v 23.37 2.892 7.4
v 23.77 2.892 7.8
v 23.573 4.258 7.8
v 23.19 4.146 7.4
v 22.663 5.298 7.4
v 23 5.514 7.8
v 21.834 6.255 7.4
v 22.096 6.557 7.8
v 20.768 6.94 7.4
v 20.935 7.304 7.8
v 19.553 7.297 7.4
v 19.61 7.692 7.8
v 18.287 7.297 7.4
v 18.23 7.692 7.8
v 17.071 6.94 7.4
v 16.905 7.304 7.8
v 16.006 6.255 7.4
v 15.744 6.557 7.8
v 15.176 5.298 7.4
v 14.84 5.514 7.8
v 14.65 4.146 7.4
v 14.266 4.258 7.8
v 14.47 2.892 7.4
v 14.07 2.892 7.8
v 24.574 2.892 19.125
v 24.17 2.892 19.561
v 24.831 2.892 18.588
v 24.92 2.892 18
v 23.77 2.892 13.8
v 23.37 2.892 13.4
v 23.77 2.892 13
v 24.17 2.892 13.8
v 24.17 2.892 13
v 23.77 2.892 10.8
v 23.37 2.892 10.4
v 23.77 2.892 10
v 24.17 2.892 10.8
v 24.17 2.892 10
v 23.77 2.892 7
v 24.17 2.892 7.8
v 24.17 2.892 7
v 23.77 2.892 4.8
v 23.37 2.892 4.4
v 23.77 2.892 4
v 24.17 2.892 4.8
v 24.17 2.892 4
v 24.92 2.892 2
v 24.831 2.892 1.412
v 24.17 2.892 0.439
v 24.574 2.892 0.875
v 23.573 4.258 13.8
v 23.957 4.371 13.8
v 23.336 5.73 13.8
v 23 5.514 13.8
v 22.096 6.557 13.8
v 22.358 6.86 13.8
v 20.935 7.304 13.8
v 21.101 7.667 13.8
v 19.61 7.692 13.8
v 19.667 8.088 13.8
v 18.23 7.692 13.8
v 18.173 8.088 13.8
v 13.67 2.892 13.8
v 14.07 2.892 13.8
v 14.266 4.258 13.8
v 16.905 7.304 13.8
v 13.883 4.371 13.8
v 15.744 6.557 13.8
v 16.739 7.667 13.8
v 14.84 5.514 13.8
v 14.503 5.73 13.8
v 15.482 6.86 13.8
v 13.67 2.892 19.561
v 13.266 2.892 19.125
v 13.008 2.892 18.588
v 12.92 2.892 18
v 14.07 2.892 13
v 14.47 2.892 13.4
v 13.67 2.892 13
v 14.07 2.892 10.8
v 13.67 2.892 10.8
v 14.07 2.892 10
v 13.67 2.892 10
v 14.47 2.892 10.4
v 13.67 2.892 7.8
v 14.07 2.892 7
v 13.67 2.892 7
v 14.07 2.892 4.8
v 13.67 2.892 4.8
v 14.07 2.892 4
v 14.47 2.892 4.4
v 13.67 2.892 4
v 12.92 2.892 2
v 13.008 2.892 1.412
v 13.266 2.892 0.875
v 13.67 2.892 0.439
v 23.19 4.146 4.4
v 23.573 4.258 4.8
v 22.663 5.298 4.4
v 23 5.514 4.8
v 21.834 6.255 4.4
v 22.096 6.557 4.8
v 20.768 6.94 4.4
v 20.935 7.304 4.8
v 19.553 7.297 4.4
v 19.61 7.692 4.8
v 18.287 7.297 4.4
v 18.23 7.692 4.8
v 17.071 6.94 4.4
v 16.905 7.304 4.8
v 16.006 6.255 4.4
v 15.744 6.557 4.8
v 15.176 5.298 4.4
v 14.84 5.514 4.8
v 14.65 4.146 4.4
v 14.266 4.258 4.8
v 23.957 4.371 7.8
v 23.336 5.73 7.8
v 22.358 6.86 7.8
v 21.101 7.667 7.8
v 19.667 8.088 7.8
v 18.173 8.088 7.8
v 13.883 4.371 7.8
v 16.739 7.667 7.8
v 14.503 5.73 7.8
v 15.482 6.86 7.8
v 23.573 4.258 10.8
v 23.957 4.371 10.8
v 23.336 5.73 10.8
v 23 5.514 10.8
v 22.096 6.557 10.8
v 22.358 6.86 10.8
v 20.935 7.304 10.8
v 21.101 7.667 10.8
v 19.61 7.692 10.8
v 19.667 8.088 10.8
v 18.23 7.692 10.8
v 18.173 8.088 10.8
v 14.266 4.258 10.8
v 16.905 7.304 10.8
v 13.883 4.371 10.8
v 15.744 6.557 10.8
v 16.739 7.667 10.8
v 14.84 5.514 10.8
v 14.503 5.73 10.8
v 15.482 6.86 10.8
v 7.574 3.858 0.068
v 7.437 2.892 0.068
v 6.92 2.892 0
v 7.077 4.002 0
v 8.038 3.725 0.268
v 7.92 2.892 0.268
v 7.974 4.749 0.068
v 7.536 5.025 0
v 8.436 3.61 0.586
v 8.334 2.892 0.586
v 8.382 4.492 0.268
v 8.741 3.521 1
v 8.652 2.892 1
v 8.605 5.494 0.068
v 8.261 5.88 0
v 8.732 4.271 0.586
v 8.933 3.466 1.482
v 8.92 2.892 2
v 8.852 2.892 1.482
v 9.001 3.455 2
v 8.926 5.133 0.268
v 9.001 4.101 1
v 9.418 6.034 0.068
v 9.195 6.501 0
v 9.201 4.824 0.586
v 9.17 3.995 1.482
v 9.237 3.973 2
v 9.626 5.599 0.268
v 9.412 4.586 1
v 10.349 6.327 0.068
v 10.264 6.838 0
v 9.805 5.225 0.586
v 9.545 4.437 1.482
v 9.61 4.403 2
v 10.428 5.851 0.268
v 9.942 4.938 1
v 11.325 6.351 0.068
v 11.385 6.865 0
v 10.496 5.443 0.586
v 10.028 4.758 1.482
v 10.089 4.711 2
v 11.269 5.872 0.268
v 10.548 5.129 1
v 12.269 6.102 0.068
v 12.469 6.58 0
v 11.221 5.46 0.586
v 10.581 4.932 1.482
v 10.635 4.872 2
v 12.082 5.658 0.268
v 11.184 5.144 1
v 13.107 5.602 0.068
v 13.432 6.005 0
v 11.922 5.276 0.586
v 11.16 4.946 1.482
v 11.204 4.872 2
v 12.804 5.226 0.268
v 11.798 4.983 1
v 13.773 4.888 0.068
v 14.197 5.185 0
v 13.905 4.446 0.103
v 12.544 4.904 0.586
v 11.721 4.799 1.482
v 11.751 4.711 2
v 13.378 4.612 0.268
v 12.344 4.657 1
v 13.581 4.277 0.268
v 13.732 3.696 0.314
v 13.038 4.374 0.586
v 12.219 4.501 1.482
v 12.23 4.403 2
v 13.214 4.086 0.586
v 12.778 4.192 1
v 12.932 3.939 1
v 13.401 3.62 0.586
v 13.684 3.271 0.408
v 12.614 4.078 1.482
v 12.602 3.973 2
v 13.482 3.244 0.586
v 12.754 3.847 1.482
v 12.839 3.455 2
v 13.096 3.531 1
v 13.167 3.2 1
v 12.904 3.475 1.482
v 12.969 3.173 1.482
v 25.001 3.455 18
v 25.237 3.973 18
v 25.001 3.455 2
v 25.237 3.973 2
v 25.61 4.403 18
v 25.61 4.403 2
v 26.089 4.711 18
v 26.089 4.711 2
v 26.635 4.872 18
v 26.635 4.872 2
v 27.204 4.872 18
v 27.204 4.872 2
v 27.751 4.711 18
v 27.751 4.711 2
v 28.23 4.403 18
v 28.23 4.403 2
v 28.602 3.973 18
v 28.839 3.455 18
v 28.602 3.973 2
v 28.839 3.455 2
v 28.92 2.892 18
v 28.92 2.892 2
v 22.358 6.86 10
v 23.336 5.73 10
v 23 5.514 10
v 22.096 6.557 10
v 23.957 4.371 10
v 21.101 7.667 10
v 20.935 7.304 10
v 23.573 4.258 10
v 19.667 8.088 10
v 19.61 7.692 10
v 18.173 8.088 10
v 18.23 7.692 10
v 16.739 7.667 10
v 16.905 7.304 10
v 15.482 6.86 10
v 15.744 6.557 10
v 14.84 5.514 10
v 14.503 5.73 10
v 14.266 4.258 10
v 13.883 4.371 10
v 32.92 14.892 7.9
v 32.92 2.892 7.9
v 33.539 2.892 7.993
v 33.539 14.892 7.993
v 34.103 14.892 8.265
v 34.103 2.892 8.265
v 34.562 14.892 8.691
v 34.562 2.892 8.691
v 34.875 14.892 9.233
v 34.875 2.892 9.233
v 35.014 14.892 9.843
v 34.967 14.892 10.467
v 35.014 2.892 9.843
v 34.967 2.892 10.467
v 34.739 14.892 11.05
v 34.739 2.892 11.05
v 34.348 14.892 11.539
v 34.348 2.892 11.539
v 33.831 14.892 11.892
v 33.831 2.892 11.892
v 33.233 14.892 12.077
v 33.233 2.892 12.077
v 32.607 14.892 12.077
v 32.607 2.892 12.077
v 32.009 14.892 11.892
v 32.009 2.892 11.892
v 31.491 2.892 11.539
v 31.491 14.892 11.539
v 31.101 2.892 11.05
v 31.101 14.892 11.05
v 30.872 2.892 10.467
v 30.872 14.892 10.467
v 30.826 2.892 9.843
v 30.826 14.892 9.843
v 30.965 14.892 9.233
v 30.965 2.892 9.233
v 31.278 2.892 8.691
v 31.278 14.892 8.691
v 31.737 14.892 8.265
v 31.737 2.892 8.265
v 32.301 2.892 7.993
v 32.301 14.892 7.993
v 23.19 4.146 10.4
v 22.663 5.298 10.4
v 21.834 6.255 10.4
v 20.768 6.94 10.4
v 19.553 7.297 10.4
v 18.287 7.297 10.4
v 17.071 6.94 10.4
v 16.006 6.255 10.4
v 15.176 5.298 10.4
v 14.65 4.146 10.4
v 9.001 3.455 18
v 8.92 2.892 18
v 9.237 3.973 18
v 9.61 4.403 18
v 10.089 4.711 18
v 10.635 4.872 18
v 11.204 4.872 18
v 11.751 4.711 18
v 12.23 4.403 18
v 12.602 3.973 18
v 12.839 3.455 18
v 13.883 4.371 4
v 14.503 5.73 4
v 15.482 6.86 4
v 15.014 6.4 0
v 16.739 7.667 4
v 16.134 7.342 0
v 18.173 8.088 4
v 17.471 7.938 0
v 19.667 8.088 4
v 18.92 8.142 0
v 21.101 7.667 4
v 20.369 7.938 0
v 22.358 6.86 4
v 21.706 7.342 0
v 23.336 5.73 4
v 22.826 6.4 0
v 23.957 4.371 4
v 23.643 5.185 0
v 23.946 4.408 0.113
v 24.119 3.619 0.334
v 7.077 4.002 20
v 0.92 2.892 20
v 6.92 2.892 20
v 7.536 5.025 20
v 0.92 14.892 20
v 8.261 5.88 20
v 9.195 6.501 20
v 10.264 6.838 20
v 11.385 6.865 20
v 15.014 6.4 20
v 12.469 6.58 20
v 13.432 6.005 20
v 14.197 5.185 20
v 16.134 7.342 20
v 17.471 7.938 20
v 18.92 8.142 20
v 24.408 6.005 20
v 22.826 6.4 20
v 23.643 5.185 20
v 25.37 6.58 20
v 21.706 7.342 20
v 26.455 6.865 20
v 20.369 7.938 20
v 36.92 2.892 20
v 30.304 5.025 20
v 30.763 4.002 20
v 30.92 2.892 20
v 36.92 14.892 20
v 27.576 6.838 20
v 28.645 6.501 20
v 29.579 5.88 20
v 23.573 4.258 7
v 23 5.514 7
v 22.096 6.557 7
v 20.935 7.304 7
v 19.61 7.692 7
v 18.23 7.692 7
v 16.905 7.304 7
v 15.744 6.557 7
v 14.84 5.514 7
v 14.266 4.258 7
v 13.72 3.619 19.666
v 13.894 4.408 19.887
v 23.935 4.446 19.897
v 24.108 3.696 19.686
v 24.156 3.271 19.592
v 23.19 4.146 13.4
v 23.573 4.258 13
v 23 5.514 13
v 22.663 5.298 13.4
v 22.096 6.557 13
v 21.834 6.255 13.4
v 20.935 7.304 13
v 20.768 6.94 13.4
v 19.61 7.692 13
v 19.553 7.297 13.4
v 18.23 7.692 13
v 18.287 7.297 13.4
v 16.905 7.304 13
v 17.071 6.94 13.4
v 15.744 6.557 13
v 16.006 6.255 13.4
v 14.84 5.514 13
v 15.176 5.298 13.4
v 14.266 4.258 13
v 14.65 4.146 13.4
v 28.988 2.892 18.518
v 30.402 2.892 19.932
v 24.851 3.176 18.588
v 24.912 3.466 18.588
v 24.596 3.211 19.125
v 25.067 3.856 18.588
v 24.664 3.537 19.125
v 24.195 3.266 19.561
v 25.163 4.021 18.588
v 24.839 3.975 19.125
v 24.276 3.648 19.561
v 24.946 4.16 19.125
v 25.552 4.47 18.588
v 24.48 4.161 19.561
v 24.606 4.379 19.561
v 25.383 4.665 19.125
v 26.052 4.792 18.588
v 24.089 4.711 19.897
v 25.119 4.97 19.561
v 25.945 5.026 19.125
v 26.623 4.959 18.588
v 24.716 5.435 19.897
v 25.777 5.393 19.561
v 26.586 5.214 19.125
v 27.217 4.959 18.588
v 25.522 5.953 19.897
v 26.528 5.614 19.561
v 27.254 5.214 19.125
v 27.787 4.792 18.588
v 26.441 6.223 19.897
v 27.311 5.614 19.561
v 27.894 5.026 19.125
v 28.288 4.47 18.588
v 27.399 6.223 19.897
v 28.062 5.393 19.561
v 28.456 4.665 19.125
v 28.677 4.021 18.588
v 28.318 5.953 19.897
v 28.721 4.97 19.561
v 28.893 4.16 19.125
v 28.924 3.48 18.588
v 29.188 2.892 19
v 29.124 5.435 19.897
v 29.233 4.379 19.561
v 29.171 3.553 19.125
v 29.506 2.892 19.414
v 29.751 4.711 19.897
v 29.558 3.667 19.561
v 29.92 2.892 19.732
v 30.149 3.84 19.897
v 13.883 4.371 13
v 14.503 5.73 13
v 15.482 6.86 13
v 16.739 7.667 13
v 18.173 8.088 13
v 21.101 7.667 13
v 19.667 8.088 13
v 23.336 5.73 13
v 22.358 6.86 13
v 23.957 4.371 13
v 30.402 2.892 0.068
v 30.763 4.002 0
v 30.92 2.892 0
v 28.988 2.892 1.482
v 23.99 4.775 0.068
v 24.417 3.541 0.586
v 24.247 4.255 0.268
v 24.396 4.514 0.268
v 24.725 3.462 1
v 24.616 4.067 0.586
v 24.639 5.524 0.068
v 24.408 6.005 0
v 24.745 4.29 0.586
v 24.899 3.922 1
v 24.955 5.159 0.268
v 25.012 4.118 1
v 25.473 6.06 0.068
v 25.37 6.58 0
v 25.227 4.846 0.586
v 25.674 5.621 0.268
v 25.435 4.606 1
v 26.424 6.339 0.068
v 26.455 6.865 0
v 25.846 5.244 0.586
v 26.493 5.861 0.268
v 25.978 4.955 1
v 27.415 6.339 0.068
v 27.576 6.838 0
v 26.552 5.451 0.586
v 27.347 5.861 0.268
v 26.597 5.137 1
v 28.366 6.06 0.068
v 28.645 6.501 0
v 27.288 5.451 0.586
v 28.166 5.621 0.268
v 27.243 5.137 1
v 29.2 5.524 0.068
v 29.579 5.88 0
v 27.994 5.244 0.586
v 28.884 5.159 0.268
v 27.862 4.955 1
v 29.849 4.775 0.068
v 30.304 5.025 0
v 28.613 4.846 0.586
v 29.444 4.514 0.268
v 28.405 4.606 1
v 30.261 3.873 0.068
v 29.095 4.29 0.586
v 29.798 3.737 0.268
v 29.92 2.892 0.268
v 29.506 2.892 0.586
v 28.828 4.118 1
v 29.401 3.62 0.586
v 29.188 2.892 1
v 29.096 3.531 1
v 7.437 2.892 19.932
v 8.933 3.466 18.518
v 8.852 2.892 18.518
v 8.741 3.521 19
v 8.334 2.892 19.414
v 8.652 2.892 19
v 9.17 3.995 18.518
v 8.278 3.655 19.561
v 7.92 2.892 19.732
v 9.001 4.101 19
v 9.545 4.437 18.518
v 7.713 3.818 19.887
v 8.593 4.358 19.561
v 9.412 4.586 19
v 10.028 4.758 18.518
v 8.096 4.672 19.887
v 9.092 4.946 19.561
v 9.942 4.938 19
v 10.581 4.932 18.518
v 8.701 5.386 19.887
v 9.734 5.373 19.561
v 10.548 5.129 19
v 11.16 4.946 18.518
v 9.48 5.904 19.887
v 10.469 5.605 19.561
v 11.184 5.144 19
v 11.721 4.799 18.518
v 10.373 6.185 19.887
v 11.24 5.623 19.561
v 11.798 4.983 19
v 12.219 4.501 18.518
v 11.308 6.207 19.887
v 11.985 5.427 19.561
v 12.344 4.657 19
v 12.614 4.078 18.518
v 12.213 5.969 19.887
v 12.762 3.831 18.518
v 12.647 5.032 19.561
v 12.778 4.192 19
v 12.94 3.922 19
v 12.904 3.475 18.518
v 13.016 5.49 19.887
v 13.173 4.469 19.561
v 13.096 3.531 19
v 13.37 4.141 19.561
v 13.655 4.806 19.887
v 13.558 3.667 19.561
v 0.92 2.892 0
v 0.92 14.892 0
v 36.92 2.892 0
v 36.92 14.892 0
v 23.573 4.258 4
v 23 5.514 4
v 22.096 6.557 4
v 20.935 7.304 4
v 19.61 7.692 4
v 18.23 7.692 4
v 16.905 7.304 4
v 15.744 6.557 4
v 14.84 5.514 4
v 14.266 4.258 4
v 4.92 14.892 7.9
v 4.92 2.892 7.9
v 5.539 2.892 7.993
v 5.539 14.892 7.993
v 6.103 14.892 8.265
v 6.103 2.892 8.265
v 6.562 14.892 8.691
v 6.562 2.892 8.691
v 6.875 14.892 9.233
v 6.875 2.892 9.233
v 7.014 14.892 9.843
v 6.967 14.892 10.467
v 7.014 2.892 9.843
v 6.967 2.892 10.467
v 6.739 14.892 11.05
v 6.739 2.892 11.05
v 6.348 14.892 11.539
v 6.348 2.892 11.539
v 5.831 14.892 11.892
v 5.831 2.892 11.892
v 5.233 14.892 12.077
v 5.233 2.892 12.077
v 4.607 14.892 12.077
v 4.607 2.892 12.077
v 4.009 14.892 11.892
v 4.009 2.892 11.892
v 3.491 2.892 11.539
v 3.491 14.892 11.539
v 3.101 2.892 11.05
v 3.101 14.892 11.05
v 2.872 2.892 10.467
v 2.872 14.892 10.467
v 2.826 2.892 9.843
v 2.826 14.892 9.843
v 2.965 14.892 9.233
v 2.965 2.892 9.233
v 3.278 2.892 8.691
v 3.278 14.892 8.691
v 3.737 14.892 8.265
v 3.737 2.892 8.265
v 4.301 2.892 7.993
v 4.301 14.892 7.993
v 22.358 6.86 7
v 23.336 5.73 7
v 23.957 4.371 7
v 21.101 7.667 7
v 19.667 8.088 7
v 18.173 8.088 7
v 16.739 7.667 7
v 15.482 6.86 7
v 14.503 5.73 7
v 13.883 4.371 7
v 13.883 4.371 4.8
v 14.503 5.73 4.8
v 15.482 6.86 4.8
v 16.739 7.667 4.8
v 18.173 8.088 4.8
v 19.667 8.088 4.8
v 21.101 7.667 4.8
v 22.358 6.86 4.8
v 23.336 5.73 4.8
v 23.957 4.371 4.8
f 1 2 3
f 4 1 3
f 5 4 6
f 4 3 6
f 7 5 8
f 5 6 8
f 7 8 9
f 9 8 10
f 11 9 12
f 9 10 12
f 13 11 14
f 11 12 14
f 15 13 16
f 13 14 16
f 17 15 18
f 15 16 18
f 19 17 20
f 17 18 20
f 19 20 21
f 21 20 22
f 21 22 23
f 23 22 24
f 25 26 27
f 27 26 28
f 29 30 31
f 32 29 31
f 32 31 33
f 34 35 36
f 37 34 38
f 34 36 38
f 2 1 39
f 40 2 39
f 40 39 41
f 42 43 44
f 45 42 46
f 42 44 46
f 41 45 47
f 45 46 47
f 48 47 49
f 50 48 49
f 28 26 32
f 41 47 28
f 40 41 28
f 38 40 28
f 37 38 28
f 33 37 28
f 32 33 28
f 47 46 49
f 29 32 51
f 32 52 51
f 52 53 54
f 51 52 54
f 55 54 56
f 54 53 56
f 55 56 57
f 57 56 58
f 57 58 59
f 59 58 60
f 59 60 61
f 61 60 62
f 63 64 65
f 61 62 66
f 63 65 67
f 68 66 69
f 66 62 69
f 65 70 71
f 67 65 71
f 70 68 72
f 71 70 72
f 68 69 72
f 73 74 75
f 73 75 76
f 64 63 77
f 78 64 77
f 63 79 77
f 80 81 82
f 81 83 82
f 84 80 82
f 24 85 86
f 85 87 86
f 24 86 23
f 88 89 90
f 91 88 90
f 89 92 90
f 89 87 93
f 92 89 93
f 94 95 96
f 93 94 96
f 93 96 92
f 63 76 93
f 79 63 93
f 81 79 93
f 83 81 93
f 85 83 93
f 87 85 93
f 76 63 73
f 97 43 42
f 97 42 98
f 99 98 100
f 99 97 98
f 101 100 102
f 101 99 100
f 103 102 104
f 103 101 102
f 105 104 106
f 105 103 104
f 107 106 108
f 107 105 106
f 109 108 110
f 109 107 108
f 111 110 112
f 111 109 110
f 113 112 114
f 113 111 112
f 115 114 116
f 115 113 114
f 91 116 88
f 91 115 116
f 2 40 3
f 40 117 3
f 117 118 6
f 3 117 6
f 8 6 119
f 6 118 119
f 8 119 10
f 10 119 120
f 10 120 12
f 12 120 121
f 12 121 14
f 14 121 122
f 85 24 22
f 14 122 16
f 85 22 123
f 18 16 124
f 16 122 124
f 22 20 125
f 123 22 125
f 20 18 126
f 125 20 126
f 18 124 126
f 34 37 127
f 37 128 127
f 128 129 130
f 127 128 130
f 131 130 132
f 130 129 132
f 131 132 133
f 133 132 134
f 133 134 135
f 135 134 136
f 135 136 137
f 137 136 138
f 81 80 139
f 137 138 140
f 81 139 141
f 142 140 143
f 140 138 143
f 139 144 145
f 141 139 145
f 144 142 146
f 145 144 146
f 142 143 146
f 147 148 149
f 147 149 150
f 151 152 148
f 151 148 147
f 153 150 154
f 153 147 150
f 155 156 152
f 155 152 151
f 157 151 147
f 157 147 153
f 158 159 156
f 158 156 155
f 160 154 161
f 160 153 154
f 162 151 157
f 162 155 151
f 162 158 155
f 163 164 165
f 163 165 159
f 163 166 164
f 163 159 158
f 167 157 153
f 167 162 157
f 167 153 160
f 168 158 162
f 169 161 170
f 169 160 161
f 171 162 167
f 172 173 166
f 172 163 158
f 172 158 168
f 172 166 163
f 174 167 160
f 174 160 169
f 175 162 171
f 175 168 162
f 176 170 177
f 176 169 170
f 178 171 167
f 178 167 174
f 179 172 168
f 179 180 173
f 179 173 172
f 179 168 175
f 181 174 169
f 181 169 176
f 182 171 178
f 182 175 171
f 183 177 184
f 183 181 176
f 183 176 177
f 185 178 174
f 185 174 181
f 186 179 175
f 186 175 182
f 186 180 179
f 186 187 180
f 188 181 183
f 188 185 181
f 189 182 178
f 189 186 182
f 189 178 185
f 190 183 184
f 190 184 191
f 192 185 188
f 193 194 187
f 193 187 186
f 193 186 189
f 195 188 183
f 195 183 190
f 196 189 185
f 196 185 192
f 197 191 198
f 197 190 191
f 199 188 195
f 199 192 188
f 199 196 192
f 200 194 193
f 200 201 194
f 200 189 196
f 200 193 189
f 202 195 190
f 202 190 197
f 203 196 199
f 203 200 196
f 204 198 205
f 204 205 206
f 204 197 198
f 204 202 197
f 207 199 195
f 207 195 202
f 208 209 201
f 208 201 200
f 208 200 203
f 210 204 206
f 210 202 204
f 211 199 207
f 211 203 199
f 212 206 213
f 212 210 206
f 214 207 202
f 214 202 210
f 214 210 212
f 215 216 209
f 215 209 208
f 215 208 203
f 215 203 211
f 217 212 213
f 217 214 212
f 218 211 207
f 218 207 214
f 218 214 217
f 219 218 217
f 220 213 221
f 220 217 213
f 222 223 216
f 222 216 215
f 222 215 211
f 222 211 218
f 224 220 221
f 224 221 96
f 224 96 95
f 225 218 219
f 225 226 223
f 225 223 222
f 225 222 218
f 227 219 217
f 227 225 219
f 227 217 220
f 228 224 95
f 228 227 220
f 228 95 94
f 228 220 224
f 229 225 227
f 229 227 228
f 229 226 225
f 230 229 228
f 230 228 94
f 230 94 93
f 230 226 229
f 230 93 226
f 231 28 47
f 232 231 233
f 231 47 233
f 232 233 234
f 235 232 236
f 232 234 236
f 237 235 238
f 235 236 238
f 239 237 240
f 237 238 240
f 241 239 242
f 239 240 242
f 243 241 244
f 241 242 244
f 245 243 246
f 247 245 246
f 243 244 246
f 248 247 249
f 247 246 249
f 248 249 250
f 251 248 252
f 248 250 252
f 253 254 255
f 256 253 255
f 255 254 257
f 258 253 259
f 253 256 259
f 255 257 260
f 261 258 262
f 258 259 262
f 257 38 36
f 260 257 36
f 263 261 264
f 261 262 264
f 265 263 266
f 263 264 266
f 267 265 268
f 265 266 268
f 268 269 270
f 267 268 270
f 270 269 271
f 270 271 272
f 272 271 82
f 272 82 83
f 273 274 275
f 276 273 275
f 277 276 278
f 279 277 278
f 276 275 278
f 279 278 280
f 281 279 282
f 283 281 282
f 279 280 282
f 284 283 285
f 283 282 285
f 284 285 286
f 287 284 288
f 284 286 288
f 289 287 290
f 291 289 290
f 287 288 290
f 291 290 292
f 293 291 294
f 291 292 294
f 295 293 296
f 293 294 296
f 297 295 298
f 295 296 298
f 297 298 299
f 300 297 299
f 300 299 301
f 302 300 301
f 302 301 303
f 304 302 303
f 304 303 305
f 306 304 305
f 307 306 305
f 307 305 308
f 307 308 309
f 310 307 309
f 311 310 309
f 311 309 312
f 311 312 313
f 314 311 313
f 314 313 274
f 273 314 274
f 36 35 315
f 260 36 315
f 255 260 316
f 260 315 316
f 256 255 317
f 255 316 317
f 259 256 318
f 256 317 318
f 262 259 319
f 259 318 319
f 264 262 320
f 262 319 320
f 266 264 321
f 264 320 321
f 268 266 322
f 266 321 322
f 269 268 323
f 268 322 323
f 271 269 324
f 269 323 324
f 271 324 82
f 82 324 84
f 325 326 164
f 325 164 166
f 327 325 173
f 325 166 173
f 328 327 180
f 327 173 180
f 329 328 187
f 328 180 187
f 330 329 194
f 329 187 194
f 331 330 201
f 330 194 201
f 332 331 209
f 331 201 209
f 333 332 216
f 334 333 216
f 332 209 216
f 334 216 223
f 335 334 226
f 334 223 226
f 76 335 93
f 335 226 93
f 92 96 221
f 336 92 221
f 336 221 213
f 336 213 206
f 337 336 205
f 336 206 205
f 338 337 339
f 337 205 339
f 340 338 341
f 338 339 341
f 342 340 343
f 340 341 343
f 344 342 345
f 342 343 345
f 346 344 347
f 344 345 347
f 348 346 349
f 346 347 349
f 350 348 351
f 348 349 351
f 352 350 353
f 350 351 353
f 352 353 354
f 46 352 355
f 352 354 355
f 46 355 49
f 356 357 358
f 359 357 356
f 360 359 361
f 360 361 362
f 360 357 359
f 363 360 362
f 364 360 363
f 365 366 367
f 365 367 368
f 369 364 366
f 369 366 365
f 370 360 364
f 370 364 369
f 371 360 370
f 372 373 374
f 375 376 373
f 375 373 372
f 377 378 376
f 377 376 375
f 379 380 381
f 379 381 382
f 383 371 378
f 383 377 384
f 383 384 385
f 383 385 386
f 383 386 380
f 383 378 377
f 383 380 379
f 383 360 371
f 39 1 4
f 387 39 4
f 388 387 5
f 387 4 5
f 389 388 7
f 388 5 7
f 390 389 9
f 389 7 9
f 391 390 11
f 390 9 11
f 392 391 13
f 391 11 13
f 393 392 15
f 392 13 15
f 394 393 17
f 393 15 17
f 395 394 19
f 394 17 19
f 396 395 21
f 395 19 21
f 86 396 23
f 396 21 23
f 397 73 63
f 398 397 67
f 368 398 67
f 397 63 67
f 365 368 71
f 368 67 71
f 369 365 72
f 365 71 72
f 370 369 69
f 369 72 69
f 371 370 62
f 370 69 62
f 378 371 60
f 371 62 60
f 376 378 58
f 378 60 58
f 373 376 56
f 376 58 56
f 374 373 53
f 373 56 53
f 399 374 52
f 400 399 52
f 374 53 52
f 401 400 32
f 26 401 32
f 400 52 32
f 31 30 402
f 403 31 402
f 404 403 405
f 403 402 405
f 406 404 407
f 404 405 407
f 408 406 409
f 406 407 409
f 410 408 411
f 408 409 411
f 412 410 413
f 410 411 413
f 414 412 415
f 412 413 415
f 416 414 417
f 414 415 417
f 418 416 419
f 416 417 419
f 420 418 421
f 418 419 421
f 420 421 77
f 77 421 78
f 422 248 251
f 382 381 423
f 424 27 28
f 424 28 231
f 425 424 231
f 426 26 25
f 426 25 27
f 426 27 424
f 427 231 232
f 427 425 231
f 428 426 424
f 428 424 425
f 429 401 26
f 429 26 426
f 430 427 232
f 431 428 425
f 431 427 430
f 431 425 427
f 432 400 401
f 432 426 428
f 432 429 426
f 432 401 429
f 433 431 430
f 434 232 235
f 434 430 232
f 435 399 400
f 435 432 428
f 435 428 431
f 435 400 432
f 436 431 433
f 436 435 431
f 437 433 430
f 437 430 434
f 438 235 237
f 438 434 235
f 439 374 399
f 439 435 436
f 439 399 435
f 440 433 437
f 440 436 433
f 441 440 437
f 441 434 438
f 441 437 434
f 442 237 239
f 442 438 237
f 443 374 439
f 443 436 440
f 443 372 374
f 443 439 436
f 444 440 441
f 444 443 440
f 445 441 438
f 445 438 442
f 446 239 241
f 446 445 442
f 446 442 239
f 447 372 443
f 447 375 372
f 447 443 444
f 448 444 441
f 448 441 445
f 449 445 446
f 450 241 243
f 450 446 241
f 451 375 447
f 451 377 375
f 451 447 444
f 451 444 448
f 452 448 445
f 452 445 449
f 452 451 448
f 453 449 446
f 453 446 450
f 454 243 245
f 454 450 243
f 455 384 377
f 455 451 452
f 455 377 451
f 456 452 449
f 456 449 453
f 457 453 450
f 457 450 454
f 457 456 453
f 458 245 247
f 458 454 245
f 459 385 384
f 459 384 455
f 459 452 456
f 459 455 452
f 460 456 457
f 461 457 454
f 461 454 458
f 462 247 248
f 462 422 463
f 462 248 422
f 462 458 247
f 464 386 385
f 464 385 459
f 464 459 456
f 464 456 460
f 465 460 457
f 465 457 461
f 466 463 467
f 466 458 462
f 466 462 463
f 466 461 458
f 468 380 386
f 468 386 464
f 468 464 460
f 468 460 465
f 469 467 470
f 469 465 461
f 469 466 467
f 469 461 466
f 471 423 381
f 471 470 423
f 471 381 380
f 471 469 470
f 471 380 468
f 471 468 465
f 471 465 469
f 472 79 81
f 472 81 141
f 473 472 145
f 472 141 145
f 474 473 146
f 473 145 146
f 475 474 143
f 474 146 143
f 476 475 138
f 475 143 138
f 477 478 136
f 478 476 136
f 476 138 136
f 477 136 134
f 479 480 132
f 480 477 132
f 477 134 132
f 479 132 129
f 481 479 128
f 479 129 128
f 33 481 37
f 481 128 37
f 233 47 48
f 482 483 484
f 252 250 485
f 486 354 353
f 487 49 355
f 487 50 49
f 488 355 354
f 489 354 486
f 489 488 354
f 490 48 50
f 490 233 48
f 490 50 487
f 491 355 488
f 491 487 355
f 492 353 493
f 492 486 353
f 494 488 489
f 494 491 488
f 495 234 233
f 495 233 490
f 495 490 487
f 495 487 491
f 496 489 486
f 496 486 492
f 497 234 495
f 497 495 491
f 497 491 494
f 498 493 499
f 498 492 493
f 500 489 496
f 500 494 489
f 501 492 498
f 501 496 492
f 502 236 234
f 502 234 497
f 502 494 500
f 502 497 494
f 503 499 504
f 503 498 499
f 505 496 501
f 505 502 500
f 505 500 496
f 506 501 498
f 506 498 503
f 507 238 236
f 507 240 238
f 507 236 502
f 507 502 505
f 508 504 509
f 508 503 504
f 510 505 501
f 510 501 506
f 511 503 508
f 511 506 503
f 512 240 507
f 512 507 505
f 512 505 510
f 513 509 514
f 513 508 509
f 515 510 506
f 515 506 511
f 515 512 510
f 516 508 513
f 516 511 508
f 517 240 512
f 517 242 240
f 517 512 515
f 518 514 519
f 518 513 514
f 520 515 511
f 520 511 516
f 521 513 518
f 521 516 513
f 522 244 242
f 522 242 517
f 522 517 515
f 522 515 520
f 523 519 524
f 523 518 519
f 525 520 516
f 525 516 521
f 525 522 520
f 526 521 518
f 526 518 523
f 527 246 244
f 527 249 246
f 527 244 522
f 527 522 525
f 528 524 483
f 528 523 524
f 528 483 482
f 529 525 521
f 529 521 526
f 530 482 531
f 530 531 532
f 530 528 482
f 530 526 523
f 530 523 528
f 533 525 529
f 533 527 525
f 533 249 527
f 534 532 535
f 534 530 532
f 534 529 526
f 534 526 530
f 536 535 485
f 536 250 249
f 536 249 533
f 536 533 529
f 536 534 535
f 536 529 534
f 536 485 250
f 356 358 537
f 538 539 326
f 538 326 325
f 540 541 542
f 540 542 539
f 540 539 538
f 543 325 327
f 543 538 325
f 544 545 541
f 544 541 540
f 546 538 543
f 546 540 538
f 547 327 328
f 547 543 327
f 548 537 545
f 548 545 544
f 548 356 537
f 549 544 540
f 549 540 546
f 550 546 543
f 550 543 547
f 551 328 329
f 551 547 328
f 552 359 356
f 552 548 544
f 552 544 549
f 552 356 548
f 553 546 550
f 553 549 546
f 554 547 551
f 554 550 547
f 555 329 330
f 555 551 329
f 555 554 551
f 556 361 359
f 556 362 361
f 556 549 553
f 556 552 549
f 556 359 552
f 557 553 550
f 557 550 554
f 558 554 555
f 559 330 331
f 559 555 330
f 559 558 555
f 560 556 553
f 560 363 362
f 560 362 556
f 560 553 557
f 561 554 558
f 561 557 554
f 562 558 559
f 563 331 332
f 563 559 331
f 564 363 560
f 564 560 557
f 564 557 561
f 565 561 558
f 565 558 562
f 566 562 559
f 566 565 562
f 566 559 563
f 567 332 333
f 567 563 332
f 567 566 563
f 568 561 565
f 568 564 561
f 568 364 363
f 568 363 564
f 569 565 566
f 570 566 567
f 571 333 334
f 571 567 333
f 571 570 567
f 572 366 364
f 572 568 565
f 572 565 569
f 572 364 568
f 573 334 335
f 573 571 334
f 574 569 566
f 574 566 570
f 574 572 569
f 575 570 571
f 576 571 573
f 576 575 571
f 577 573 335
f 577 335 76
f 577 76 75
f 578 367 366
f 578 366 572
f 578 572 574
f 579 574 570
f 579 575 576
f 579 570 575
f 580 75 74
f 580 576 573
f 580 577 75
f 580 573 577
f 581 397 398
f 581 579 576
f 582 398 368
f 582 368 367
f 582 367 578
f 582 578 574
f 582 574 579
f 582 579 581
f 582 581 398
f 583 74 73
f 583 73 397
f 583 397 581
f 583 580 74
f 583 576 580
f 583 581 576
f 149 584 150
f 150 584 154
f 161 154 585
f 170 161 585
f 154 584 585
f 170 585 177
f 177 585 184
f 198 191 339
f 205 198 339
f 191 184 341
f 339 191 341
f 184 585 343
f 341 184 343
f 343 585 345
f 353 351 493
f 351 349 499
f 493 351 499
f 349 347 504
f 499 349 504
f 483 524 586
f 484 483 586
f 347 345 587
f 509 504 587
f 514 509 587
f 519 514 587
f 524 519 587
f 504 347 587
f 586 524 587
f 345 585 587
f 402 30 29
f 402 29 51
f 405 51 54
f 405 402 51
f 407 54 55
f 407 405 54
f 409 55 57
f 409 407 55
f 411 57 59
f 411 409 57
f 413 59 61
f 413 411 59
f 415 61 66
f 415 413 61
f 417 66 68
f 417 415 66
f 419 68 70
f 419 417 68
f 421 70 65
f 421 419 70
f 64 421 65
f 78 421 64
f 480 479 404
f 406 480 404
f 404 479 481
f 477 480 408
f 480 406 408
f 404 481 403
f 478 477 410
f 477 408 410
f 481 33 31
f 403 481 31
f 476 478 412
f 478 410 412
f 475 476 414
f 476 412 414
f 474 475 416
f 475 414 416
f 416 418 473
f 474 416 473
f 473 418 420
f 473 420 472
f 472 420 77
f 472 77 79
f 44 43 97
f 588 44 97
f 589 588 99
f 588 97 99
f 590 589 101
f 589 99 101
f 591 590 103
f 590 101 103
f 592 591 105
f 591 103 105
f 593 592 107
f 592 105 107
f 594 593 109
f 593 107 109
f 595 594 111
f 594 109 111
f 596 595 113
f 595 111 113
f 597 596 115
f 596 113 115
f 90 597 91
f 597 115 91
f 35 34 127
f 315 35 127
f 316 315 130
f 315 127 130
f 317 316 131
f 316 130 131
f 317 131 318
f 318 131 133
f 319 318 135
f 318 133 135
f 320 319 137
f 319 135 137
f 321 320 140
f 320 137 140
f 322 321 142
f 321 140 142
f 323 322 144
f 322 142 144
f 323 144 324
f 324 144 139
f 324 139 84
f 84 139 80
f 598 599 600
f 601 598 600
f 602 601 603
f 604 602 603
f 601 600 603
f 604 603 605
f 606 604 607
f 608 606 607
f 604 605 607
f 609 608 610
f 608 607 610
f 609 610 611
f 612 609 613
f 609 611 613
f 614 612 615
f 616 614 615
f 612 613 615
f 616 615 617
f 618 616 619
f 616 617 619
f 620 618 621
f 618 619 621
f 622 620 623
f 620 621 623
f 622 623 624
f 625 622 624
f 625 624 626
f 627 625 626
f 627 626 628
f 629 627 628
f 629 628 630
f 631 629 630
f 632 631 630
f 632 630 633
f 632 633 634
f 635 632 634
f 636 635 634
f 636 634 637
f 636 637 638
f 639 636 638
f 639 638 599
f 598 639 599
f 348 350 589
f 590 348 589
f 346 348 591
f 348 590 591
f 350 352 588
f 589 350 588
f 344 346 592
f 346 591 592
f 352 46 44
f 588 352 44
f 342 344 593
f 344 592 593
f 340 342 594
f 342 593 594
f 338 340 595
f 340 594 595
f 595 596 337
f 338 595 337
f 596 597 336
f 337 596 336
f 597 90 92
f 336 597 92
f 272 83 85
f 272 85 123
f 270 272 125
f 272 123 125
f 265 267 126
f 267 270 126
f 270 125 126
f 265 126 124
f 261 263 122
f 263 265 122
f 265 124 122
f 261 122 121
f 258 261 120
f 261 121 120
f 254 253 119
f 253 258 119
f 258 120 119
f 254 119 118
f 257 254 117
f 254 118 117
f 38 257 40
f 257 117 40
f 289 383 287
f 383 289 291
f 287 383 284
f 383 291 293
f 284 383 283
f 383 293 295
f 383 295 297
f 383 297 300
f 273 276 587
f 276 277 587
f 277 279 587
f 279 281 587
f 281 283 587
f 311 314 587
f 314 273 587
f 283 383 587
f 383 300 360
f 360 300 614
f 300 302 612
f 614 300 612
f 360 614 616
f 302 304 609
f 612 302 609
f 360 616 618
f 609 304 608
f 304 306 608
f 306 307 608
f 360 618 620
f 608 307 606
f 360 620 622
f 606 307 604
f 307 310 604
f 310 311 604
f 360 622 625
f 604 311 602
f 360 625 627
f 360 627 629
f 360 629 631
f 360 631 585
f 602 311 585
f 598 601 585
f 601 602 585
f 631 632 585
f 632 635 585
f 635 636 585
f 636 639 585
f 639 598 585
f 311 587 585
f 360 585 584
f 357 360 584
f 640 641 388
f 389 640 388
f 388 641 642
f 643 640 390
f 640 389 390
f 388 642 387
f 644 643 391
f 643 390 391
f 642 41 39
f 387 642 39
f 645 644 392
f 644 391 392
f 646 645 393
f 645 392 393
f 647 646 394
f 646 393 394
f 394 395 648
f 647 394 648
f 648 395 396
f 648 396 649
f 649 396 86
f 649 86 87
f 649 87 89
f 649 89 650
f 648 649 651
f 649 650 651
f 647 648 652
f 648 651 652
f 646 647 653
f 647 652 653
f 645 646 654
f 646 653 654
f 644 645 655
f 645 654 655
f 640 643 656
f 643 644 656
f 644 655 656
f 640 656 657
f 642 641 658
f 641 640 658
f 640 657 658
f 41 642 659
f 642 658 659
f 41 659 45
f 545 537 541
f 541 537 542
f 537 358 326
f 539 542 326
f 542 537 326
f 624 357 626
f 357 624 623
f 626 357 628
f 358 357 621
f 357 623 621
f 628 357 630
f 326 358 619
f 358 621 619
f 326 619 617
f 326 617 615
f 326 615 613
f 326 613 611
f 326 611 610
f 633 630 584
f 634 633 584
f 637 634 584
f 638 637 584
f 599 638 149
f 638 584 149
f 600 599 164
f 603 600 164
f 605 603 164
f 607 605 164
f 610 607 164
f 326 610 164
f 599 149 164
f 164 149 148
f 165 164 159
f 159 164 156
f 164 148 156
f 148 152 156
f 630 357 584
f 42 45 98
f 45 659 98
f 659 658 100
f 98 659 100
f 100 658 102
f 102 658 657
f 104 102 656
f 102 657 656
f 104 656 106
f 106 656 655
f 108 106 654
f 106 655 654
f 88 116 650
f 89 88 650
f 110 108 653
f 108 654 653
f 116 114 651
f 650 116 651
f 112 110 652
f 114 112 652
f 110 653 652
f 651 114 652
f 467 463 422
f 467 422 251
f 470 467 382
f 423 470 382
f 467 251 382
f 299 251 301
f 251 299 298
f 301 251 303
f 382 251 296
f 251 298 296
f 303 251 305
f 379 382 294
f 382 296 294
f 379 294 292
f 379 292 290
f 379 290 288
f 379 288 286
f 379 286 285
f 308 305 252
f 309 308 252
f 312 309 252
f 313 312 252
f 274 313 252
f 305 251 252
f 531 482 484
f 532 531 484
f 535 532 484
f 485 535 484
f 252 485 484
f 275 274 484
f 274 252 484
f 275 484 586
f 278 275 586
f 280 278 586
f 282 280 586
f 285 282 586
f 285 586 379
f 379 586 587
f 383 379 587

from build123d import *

# Parameters (mm, degrees)
BOSS_EXTRUDE1_DEPTH = 20
SKETCH2_W           = 0.8000000000000007
SKETCH2_H           = 0.7999999999999989
SKETCH2_H_2         = 0.8000000000000007
CHAMFER1_SIZE       = 0.4
FILLET2_R           = 2
SKETCH3_R           = 2.100000000000004
SKETCH3_R_2         = 2.100000000000001
CUT_EXTRUDE1_DEPTH  = 44.67007193971907


# Some blends are built 0.0001 mm under size
with BuildPart() as part:
    # Sketch1 → Boss-Extrude1 (new body)
    with BuildSketch(Plane.XY):
        with BuildLine():
            Line((0.9198479389646088, 14.89190109356241), (0.9198479389646088, 2.89190109356241))
            Line((0.9198479389646081, 2.89190109356241), (8.919847938964608, 2.89190109356241))
            ThreePointArc((8.919847938964608, 2.8919010935624105), (10.919847938964608, 4.89190109356241), (12.919847938964608, 2.89190109356241))
            Line((12.919847938964608, 2.89190109356241), (13.669847938964606, 2.89190109356241))
            ThreePointArc((13.669847938964608, 2.8919010935624114), (18.919847938964608, 8.14190109356241), (24.169847938964608, 2.89190109356241))
            Line((24.169847938964608, 2.89190109356241), (24.919847938964608, 2.89190109356241))
            ThreePointArc((24.919847938964608, 2.8919010935624105), (26.919847938964608, 4.891901093562406), (28.919847938964608, 2.89190109356241))
            Line((28.919847938964605, 2.89190109356241), (36.91984793896461, 2.89190109356241))
            Line((36.91984793896461, 2.89190109356241), (36.91984793896461, 14.89190109356241))
            Line((36.91984793896461, 14.89190109356241), (0.9198479389646088, 14.89190109356241))
        make_face()
    extrude(amount=BOSS_EXTRUDE1_DEPTH)

    # Sweep2: sweep along a curve in space
    with BuildLine() as sweep2_path:
        ThreePointArc((24.169847938964608, 2.89190109356241, 20), (22.632158540193984, 6.604211694791784, 20), (18.919847938964608, 8.141901093562412, 20))
        ThreePointArc((18.919847938964608, 8.141901093562412, 20), (15.207537337735232, 6.604211694791786, 20), (13.669847938964606, 2.89190109356241, 20))
    # Sketch2 → Sweep2 (sweep)
    with BuildSketch(Plane.XZ.offset(-2.89190109356241)):
        with Locations((14.069847938964607, 13.400000000000006)):
            Rectangle(SKETCH2_W, SKETCH2_H)
        with Locations((14.069847938964607, 10.400000000000004)):
            Rectangle(SKETCH2_W, SKETCH2_H_2)
        with Locations((14.069847938964607, 7.400000000000003)):
            Rectangle(SKETCH2_W, SKETCH2_H_2)
        Polygon((13.669847938964608, 4.8000000000000025), (14.469847938964607, 4.8000000000000025), (14.469847938964609, 4.000000000000002), (13.669847938964608, 4.000000000000002), align=None)
    sweep(path=sweep2_path.line)

    # Chamfer1
    chamfer1_edges = [part.edges().sort_by_distance(p)[0] for p in [
        (18.919847938964608, 7.341901093562408, 4.000000000000002),
        (18.919847938964608, 7.341901093562411, 4.8000000000000025),
        (18.919847938964608, 7.341901093562411, 7.0000000000000036),
        (18.919847938964608, 7.341901093562413, 7.800000000000004),
        (18.919847938964608, 7.341901093562413, 13.800000000000004),
        (18.919847938964608, 7.341901093562411, 13.000000000000005),
        (18.919847938964608, 7.341901093562413, 10.800000000000004),
        (18.919847938964608, 7.341901093562411, 10.000000000000004),
    ]]
    chamfer(chamfer1_edges, length=CHAMFER1_SIZE - 0.0001)  # a hair under: the kernel refuses the full size

    # Fillet2
    # the kernel refuses this fillet: 2 mm, written as the material it takes off along each edge
    with BuildSketch(Plane(origin=(10.919847938964608, 2.89190109356241, 0), x_dir=(-0.003141587485879782, -0.9999950652018582, 0), z_dir=(0.9999950652018582, -0.003141587485879782, 0))) as fillet2_piece_1:
        with BuildLine():
            CenterArc((2 + FILLET2_R, -FILLET2_R), FILLET2_R, 89.99999999999997, 90)
            Line((2 + FILLET2_R, 2.2e-16), (2, 0))
            Line((2, 0), (2, -FILLET2_R))
        make_face()
    revolve(axis=Axis((10.919847938964608, 2.89190109356241, 0), (0, 0, -1)), revolution_arc=359.64000000000004, mode=Mode.SUBTRACT)
    with BuildSketch(Plane(origin=(26.919847938964608, 2.8919010935624057, 0), x_dir=(-0.003141587485879782, -0.9999950652018582, 0), z_dir=(0.9999950652018582, -0.003141587485879782, 0))) as fillet2_piece_2:
        with BuildLine():
            CenterArc((2.000000000000005 + FILLET2_R, -FILLET2_R), FILLET2_R, 90, 90)
            Line((2.000000000000005, -FILLET2_R), (2.000000000000005, 0))
            Line((2.000000000000005, 0), (2.000000000000005 + FILLET2_R, 0))
        make_face()
    revolve(axis=Axis((26.919847938964608, 2.8919010935624057, 0), (0, 0, -1)), revolution_arc=359.64, mode=Mode.SUBTRACT)
    with BuildSketch(Plane(origin=(10.919847938964608, 2.89190109356241, 20), x_dir=(-0.003141587485879782, -0.9999950652018582, 0), z_dir=(0.9999950652018582, -0.003141587485879782, 0))) as fillet2_piece_3:
        with BuildLine():
            CenterArc((2.0000000000000058 + FILLET2_R, FILLET2_R), FILLET2_R, 180, 90)
            Line((2.0000000000000058, FILLET2_R), (2.0000000000000058, 0))
            Line((2.0000000000000058, 0), (2.0000000000000058 + FILLET2_R, 0))
        make_face()
    revolve(axis=Axis((10.919847938964608, 2.89190109356241, 20), (0, 0, -1)), revolution_arc=359.64000000000004, mode=Mode.SUBTRACT)
    with BuildSketch(Plane(origin=(26.919847938964608, 2.8919010935624057, 20), x_dir=(-0.003141587485879782, -0.9999950652018582, 0), z_dir=(0.9999950652018582, -0.003141587485879782, 0))) as fillet2_piece_4:
        with BuildLine():
            CenterArc((2.000000000000005 + FILLET2_R, FILLET2_R), FILLET2_R, 180, 90)
            Line((2.000000000000005, FILLET2_R), (2.000000000000005, 0))
            Line((2.000000000000005, 0), (2.000000000000005 + FILLET2_R, 0))
        make_face()
    revolve(axis=Axis((26.919847938964608, 2.8919010935624057, 20), (0, 0, -1)), revolution_arc=359.64, mode=Mode.SUBTRACT)

    # Sketch3 → Cut-Extrude1 (cut, through all)
    with BuildSketch(Plane.XZ.offset(-2.89190109356241)):
        with Locations(Location((32.9198479389646, 10, 0), (0, 0, 270))):
            Circle(SKETCH3_R)
        with Locations(Location((4.919847938964609, 10, 0), (0, 0, 270))):
            Circle(SKETCH3_R_2)
    extrude(amount=-CUT_EXTRUDE1_DEPTH, mode=Mode.SUBTRACT)


solid = part.part
